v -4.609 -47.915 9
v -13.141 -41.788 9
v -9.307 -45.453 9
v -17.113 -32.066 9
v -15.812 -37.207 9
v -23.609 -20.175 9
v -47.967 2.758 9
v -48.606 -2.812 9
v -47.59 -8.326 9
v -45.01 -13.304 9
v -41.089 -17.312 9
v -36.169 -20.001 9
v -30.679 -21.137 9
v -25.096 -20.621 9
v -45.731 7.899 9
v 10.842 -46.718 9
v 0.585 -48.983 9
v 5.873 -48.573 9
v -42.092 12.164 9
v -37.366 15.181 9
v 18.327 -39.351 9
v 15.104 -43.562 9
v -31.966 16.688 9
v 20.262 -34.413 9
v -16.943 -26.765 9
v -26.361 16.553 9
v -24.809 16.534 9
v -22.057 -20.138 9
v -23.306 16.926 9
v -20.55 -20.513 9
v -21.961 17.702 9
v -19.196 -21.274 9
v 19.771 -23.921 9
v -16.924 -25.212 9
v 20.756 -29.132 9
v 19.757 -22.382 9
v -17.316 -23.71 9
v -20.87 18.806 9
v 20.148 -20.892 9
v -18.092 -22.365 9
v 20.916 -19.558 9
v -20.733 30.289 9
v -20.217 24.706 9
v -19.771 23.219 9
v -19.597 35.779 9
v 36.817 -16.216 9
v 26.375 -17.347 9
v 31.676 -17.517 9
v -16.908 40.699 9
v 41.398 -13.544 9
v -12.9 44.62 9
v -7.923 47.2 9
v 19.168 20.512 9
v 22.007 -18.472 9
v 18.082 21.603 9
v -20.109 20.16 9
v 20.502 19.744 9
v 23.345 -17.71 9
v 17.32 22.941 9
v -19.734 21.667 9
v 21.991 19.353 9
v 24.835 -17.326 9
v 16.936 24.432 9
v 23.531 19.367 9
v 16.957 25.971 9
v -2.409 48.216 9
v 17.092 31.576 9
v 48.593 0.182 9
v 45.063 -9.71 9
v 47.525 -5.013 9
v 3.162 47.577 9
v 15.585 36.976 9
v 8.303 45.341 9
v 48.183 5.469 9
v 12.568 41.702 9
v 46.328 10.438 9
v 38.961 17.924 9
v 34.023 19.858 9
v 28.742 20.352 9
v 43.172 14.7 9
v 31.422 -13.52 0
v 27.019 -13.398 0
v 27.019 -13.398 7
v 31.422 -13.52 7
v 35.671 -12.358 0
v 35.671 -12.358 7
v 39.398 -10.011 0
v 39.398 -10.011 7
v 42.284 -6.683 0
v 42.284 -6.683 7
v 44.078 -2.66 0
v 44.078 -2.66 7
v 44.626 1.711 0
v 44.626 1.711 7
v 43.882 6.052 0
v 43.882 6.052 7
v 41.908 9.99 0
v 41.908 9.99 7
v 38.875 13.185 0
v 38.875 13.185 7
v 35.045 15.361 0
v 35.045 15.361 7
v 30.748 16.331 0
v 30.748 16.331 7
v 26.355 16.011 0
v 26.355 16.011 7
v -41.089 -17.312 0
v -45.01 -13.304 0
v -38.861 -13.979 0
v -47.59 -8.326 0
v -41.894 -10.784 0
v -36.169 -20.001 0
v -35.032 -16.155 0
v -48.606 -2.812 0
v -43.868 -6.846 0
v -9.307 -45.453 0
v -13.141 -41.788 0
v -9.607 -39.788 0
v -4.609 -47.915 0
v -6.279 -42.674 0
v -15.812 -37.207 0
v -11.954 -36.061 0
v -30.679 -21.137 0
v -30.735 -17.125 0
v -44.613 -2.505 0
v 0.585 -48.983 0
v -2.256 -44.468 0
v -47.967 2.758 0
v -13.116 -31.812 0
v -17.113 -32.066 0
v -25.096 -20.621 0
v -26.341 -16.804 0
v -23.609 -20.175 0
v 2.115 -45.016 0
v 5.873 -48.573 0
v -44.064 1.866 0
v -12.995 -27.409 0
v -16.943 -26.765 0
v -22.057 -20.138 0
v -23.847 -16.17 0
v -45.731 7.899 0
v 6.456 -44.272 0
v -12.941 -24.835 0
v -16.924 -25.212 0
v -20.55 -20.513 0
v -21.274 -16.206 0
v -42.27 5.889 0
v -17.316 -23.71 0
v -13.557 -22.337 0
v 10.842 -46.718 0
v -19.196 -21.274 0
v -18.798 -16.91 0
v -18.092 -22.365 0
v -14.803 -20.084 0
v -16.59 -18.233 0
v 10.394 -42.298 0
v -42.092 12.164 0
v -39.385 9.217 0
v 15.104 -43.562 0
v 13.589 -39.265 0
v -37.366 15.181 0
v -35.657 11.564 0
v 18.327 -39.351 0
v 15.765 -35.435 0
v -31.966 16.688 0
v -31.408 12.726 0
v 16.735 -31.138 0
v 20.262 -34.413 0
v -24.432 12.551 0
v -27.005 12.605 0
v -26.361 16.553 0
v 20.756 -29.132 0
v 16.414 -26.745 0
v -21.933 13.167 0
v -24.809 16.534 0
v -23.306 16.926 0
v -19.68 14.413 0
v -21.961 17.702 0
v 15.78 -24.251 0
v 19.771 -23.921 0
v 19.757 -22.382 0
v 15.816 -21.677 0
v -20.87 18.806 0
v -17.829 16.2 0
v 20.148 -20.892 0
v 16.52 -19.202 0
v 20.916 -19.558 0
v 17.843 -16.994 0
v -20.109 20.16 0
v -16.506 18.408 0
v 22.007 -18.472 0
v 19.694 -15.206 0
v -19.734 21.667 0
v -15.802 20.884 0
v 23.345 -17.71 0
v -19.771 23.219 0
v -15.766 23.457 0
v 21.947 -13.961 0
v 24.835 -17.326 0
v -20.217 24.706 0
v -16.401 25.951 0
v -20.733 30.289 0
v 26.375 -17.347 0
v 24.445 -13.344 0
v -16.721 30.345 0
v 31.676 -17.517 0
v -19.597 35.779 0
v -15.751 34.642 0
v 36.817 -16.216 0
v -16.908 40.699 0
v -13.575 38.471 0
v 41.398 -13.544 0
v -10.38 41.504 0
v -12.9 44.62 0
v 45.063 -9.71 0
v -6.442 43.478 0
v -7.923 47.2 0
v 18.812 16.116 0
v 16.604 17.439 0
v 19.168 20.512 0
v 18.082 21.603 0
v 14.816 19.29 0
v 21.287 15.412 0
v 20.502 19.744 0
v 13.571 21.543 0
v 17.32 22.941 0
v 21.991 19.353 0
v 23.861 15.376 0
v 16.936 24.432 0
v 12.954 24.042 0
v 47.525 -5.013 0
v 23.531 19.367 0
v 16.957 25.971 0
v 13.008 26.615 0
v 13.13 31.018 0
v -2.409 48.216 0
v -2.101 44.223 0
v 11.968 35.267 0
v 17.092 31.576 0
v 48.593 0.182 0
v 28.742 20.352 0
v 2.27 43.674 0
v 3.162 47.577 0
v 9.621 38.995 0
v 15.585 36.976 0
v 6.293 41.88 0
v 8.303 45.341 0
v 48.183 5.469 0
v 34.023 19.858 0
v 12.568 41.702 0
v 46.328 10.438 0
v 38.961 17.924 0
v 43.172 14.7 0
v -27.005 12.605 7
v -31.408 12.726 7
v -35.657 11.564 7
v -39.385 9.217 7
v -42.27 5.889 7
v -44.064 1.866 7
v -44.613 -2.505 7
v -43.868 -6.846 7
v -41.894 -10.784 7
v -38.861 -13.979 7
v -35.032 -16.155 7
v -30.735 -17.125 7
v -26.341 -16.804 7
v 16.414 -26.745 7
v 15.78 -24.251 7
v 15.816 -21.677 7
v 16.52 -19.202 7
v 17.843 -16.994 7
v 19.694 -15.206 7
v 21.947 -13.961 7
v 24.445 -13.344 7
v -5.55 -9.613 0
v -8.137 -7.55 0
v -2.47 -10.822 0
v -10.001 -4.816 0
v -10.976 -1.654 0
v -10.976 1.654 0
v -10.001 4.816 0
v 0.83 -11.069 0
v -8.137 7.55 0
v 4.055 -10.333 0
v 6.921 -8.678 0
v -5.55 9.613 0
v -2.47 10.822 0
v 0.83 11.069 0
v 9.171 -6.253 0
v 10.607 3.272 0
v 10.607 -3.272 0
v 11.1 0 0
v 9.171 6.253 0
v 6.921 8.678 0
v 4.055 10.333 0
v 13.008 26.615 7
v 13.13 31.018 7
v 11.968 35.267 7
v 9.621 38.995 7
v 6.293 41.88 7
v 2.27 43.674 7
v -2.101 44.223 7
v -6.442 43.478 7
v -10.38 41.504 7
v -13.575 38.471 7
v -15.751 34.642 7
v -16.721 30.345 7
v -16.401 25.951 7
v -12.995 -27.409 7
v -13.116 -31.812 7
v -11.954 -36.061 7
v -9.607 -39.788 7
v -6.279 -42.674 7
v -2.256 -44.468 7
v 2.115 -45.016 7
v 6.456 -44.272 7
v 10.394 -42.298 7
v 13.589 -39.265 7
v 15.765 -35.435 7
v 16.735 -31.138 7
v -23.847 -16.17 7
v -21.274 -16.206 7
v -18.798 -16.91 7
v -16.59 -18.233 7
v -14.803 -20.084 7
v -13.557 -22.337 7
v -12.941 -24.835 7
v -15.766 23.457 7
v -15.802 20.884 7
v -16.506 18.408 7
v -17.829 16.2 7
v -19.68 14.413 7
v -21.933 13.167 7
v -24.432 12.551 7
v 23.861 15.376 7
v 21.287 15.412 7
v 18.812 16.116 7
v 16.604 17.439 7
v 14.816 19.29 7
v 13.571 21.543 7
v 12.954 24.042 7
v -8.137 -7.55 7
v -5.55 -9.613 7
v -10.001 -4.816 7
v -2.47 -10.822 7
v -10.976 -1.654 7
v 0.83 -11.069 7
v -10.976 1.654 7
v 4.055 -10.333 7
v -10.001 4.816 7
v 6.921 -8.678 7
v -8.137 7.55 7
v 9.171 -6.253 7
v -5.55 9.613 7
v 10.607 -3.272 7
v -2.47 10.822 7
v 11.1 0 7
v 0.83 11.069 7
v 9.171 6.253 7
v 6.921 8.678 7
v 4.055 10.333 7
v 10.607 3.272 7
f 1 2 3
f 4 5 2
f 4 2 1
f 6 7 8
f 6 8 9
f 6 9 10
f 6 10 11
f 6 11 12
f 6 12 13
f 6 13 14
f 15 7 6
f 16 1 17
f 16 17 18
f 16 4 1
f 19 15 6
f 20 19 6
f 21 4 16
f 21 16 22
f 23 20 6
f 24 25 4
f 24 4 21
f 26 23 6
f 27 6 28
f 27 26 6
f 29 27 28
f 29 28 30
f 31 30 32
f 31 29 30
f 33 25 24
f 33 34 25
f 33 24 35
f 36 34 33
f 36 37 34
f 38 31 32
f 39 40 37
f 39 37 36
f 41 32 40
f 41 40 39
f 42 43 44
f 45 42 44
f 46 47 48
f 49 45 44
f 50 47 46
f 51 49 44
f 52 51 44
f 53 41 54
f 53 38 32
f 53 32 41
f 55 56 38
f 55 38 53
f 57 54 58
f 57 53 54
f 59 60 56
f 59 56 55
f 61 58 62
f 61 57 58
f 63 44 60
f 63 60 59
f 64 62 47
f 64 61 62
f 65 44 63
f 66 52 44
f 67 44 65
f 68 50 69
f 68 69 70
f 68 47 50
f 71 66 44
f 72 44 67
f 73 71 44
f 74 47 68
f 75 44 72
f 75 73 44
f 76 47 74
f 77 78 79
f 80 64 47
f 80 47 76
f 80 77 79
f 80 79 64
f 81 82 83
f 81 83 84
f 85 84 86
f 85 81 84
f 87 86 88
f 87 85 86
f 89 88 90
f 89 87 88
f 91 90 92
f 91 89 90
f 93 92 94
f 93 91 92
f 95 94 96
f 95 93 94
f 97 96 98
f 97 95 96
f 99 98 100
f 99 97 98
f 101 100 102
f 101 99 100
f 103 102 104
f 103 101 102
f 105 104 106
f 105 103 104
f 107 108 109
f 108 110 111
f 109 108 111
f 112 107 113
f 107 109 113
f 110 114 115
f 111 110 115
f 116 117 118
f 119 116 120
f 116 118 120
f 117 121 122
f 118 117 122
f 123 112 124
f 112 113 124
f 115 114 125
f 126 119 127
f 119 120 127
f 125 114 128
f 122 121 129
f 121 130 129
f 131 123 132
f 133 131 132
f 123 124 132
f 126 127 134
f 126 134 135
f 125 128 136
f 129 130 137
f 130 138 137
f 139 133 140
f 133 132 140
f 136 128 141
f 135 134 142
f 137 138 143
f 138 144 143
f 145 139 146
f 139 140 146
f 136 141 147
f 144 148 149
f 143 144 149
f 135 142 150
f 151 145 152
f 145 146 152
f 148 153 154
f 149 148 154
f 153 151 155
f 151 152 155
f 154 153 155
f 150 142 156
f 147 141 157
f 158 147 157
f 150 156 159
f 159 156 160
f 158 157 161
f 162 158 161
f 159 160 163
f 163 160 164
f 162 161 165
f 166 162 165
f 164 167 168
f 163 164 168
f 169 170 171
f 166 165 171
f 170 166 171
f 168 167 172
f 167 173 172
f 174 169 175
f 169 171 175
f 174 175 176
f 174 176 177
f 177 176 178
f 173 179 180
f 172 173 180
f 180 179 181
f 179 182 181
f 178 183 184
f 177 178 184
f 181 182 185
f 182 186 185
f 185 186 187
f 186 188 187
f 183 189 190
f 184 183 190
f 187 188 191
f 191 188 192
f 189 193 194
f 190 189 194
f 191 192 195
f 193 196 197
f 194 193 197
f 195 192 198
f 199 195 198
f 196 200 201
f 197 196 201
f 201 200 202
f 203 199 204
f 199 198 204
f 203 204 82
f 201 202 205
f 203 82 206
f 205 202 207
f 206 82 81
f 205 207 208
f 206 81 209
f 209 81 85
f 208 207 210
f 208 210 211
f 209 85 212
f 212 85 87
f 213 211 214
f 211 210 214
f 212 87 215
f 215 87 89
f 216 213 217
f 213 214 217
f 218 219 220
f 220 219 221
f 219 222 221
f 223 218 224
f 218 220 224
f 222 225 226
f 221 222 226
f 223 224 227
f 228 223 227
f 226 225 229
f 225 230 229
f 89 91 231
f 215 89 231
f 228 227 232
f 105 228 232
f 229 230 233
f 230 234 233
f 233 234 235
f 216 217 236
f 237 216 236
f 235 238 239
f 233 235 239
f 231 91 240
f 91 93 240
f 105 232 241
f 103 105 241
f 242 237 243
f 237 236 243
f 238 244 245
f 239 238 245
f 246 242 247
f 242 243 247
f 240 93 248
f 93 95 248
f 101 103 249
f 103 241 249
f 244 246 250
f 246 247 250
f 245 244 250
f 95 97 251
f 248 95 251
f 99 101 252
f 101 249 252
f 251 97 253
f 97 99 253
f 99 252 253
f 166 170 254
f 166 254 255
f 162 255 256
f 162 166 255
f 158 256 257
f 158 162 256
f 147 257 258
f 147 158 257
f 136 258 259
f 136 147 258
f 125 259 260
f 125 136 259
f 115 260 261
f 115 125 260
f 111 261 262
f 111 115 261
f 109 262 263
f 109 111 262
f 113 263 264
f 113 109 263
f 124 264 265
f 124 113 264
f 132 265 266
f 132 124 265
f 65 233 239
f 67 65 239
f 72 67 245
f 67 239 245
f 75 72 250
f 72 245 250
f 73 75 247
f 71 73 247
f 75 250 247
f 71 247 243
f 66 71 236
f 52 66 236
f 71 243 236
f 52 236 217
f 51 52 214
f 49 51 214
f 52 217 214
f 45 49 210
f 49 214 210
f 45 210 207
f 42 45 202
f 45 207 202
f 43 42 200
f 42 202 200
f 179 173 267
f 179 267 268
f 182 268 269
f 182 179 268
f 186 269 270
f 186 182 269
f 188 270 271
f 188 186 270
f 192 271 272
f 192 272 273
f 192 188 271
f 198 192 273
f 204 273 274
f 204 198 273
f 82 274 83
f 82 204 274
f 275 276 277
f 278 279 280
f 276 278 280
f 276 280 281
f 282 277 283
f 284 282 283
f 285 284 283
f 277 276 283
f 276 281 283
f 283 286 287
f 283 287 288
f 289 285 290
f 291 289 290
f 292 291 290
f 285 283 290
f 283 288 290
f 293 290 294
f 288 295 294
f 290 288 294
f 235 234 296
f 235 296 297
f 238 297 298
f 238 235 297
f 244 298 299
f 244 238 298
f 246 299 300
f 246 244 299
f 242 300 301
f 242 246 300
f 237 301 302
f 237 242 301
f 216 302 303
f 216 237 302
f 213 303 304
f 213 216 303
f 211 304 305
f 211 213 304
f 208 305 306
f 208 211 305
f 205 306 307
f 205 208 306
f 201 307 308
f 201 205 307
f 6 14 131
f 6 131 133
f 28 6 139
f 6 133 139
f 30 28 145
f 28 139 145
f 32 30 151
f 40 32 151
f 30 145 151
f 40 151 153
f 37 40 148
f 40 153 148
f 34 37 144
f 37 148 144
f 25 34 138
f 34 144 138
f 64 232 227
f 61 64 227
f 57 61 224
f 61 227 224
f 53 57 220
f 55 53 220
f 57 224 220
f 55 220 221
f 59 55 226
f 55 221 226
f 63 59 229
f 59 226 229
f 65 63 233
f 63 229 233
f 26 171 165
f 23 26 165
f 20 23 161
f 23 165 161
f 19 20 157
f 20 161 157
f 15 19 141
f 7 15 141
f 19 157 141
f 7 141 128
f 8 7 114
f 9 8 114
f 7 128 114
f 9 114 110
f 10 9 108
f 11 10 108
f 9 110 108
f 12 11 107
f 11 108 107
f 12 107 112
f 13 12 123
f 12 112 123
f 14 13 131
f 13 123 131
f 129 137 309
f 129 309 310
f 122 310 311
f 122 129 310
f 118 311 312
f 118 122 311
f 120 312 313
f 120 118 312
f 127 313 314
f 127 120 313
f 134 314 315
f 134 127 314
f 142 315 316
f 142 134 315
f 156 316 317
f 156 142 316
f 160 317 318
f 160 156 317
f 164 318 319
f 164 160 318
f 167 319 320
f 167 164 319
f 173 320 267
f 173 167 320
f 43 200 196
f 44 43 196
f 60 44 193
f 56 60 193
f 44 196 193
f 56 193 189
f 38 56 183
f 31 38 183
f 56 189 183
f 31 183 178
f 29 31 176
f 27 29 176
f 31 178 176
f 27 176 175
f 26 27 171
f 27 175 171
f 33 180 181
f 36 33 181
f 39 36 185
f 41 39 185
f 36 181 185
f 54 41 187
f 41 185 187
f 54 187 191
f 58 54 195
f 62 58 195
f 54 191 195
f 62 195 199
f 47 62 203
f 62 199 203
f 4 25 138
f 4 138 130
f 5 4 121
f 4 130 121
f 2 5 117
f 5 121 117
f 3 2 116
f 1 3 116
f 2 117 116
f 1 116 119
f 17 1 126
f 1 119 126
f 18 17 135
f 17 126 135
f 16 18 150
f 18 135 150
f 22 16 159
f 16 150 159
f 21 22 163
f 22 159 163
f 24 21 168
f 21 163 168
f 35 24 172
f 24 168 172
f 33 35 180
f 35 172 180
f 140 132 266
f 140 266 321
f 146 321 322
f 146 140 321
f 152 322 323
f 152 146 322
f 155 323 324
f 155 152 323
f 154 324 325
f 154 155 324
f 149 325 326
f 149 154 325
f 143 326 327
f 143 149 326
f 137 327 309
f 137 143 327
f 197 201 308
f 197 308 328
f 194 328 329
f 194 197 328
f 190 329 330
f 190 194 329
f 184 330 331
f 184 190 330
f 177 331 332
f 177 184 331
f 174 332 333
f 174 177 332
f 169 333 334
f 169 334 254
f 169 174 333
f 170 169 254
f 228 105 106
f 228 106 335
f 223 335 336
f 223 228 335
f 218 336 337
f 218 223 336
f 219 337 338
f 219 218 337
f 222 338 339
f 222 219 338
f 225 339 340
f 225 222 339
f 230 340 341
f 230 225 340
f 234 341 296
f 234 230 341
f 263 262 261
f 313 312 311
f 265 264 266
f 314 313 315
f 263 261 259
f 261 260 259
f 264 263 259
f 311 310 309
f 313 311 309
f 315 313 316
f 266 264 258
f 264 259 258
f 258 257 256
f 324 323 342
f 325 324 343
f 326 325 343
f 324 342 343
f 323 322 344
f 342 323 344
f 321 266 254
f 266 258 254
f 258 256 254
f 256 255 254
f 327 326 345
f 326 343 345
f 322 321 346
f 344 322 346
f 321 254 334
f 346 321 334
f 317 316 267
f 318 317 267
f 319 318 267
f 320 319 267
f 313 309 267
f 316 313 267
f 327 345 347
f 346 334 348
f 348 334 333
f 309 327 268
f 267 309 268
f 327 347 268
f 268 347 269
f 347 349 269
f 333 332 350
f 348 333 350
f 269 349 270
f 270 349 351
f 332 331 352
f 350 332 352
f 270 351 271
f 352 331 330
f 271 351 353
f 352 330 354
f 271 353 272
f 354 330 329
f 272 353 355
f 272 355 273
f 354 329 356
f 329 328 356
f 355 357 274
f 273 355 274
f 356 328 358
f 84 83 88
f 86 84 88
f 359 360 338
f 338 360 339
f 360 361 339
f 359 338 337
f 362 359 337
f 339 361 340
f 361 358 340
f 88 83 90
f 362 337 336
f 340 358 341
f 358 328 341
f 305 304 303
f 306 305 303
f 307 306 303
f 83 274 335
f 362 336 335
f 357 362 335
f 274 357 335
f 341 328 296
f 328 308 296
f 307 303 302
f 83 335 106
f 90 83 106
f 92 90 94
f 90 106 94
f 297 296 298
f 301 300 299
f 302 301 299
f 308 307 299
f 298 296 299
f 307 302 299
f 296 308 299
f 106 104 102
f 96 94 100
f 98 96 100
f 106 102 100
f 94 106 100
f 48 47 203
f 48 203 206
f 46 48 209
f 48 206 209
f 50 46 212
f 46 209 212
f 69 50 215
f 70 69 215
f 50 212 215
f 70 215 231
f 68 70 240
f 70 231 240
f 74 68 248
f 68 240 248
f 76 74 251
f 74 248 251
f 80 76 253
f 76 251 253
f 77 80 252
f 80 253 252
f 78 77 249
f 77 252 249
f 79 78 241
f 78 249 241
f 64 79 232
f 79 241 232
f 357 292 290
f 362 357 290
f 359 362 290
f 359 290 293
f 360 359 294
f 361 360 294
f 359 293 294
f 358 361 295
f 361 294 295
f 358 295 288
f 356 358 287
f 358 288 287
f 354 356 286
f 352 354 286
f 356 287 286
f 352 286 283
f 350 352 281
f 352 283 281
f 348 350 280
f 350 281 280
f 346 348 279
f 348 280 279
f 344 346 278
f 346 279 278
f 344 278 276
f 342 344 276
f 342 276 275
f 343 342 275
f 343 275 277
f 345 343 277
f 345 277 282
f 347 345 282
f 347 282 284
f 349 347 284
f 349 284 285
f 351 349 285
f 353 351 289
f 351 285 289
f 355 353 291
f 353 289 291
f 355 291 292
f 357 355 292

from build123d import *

# Parameters (mm, degrees)
F0_R     = 11.1
F1_DEPTH = 7
F2_DEPTH = 9


with BuildPart() as f1:
    # F0 (on Top) → F1 (new body)
    with BuildSketch(Plane.XY):
        with BuildLine():
            ThreePointArc((-26.341428, -16.80438), (-16.590351, -18.23282), (-12.994606, -27.40858))
            ThreePointArc((-12.994606, -27.40858), (2.114536, -45.016492), (16.414367, -26.745214))
            ThreePointArc((16.414367, -26.745214), (17.842807, -16.994137), (27.018567, -13.398392))
            ThreePointArc((27.018567, -13.398392), (44.626479, 1.71075), (26.355201, 16.010581))
            ThreePointArc((26.355201, 16.010581), (16.604124, 17.439021), (13.008379, 26.614781))
            ThreePointArc((13.008379, 26.614781), (-2.100763, 44.222693), (-16.400594, 25.951415))
            ThreePointArc((-16.400594, 25.951415), (-17.829034, 16.200338), (-27.004794, 12.604593))
            ThreePointArc((-27.004794, 12.604593), (-44.612706, -2.504549), (-26.341428, -16.80438))
        make_face()
        Circle(F0_R, mode=Mode.SUBTRACT)
    extrude(amount=F1_DEPTH)


with BuildPart() as f2:
    # F0 (on Top) → F2 (new body)
    with BuildSketch(Plane.XY):
        with BuildLine():
            ThreePointArc((-20.216963, 24.70624), (-20.869737, 18.8064), (-26.36112, 16.552751))
            ThreePointArc((-26.36112, 16.552751), (-48.605531, -2.812407), (-25.096253, -20.620749))
            ThreePointArc((-25.096253, -20.620749), (-19.196413, -21.273523), (-16.942764, -26.764906))
            ThreePointArc((-16.942764, -26.764906), (3.243662, -48.963558), (19.770673, -23.920997))
            ThreePointArc((19.770673, -23.920997), (21.425083, -18.978612), (26.374893, -17.34655))
            ThreePointArc((26.374893, -17.34655), (48.573545, 2.839876), (23.530984, 19.366887))
            ThreePointArc((23.530984, 19.366887), (18.588599, 21.021297), (16.956537, 25.971107))
            ThreePointArc((16.956537, 25.971107), (-2.408621, 48.215518), (-20.216963, 24.70624))
        make_face()
        with BuildLine():
            ThreePointArc((16.414367, -26.745214), (2.114536, -45.016492), (-12.994606, -27.40858))
            ThreePointArc((-12.994606, -27.40858), (-16.590351, -18.23282), (-26.341428, -16.80438))
            ThreePointArc((-26.341428, -16.80438), (-44.612706, -2.504549), (-27.004794, 12.604593))
            ThreePointArc((-27.004794, 12.604593), (-17.829034, 16.200338), (-16.400594, 25.951415))
            ThreePointArc((-16.400594, 25.951415), (-2.100763, 44.222693), (13.008379, 26.614781))
            ThreePointArc((13.008379, 26.614781), (16.604124, 17.439021), (26.355201, 16.010581))
            ThreePointArc((26.355201, 16.010581), (44.626479, 1.71075), (27.018567, -13.398392))
            ThreePointArc((27.018567, -13.398392), (17.842807, -16.994137), (16.414367, -26.745214))
        make_face(mode=Mode.SUBTRACT)
        with BuildLine():
            ThreePointArc((-26.341428, -16.80438), (-16.590351, -18.23282), (-12.994606, -27.40858))
            ThreePointArc((-12.994606, -27.40858), (2.114536, -45.016492), (16.414367, -26.745214))
            ThreePointArc((16.414367, -26.745214), (17.842807, -16.994137), (27.018567, -13.398392))
            ThreePointArc((27.018567, -13.398392), (44.626479, 1.71075), (26.355201, 16.010581))
            ThreePointArc((26.355201, 16.010581), (16.604124, 17.439021), (13.008379, 26.614781))
            ThreePointArc((13.008379, 26.614781), (-2.100763, 44.222693), (-16.400594, 25.951415))
            ThreePointArc((-16.400594, 25.951415), (-17.829034, 16.200338), (-27.004794, 12.604593))
            ThreePointArc((-27.004794, 12.604593), (-44.612706, -2.504549), (-26.341428, -16.80438))
        make_face()
        Circle(F0_R, mode=Mode.SUBTRACT)
        Circle(F0_R)
    extrude(amount=F2_DEPTH)

    # F3: cut F1
    add(f1.part, mode=Mode.SUBTRACT)


solid = f2.part
